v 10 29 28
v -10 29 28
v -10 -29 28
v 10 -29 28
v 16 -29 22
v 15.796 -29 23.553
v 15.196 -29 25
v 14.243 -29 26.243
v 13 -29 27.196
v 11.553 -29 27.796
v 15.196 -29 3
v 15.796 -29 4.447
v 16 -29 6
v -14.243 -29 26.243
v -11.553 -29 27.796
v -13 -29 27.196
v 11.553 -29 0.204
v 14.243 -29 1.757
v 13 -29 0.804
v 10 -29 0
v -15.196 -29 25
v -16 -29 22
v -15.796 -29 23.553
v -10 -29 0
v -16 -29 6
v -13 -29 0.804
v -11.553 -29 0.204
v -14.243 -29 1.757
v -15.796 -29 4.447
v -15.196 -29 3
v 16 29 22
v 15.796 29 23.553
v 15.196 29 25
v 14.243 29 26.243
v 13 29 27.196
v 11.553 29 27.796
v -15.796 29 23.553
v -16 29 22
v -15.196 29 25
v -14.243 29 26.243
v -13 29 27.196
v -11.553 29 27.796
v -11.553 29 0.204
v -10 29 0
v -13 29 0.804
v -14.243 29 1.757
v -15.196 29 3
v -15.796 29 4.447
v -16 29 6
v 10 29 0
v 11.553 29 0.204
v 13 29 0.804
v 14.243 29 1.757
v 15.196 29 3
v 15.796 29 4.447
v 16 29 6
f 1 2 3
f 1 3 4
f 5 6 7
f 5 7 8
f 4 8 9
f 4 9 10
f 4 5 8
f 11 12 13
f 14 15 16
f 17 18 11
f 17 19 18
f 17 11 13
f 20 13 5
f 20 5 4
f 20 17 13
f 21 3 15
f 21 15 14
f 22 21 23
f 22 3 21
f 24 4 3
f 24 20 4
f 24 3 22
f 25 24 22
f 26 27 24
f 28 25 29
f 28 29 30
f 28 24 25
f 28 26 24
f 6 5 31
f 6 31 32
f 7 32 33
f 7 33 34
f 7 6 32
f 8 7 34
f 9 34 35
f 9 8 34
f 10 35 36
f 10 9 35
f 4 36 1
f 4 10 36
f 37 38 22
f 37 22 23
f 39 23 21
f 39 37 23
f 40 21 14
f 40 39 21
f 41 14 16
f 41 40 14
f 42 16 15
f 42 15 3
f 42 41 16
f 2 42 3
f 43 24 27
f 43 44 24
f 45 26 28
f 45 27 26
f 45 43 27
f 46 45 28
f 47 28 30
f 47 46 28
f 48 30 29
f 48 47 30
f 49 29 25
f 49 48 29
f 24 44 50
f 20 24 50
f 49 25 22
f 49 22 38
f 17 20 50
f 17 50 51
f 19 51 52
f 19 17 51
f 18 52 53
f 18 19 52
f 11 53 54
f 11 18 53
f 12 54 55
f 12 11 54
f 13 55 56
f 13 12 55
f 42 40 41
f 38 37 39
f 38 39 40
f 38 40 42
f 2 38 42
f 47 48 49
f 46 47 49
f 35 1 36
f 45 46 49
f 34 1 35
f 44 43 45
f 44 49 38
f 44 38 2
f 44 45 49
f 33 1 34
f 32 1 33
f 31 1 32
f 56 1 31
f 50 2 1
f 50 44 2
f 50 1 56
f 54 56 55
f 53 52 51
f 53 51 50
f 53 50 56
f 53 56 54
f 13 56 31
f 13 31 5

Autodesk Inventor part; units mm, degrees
ref_plane "YZ Plane" through (0, 0, 0) normal (1, 0, 0) x (0, 1, 0)
ref_plane "XZ Plane" through (0, 0, 0) normal (0, 1, 0) x (-1, 0, 0)
ref_plane "XY Plane" through (0, 0, 0) normal (0, 0, 1) x (1, 0, 0)
sketch "スケッチ1" plane through (0, 0, 0) normal (0, 0, 1) x (1, 0, 0)
  line L0 (-16, 29) -> (16, 29)
  line L1 (16, 29) -> (16, -29)
  line L2 (16, -29) -> (-16, -29)
  line L3 (-16, -29) -> (-16, 29)
  point P0 (0, 0)
  point P1 (-16, 0)
  point P2 (0, -29)
  dimension "d0" = 32
  dimension "d1" = 58
extrude "押し出し1" add sketch "スケッチ1" along normal blind 28
fillet "フィレット1" radius 6 4 edges at (16, 0, 28) (-16, 0, 28) (-16, 0, 0) (16, 0, 0)
properties part number "AA-Cellx4"
